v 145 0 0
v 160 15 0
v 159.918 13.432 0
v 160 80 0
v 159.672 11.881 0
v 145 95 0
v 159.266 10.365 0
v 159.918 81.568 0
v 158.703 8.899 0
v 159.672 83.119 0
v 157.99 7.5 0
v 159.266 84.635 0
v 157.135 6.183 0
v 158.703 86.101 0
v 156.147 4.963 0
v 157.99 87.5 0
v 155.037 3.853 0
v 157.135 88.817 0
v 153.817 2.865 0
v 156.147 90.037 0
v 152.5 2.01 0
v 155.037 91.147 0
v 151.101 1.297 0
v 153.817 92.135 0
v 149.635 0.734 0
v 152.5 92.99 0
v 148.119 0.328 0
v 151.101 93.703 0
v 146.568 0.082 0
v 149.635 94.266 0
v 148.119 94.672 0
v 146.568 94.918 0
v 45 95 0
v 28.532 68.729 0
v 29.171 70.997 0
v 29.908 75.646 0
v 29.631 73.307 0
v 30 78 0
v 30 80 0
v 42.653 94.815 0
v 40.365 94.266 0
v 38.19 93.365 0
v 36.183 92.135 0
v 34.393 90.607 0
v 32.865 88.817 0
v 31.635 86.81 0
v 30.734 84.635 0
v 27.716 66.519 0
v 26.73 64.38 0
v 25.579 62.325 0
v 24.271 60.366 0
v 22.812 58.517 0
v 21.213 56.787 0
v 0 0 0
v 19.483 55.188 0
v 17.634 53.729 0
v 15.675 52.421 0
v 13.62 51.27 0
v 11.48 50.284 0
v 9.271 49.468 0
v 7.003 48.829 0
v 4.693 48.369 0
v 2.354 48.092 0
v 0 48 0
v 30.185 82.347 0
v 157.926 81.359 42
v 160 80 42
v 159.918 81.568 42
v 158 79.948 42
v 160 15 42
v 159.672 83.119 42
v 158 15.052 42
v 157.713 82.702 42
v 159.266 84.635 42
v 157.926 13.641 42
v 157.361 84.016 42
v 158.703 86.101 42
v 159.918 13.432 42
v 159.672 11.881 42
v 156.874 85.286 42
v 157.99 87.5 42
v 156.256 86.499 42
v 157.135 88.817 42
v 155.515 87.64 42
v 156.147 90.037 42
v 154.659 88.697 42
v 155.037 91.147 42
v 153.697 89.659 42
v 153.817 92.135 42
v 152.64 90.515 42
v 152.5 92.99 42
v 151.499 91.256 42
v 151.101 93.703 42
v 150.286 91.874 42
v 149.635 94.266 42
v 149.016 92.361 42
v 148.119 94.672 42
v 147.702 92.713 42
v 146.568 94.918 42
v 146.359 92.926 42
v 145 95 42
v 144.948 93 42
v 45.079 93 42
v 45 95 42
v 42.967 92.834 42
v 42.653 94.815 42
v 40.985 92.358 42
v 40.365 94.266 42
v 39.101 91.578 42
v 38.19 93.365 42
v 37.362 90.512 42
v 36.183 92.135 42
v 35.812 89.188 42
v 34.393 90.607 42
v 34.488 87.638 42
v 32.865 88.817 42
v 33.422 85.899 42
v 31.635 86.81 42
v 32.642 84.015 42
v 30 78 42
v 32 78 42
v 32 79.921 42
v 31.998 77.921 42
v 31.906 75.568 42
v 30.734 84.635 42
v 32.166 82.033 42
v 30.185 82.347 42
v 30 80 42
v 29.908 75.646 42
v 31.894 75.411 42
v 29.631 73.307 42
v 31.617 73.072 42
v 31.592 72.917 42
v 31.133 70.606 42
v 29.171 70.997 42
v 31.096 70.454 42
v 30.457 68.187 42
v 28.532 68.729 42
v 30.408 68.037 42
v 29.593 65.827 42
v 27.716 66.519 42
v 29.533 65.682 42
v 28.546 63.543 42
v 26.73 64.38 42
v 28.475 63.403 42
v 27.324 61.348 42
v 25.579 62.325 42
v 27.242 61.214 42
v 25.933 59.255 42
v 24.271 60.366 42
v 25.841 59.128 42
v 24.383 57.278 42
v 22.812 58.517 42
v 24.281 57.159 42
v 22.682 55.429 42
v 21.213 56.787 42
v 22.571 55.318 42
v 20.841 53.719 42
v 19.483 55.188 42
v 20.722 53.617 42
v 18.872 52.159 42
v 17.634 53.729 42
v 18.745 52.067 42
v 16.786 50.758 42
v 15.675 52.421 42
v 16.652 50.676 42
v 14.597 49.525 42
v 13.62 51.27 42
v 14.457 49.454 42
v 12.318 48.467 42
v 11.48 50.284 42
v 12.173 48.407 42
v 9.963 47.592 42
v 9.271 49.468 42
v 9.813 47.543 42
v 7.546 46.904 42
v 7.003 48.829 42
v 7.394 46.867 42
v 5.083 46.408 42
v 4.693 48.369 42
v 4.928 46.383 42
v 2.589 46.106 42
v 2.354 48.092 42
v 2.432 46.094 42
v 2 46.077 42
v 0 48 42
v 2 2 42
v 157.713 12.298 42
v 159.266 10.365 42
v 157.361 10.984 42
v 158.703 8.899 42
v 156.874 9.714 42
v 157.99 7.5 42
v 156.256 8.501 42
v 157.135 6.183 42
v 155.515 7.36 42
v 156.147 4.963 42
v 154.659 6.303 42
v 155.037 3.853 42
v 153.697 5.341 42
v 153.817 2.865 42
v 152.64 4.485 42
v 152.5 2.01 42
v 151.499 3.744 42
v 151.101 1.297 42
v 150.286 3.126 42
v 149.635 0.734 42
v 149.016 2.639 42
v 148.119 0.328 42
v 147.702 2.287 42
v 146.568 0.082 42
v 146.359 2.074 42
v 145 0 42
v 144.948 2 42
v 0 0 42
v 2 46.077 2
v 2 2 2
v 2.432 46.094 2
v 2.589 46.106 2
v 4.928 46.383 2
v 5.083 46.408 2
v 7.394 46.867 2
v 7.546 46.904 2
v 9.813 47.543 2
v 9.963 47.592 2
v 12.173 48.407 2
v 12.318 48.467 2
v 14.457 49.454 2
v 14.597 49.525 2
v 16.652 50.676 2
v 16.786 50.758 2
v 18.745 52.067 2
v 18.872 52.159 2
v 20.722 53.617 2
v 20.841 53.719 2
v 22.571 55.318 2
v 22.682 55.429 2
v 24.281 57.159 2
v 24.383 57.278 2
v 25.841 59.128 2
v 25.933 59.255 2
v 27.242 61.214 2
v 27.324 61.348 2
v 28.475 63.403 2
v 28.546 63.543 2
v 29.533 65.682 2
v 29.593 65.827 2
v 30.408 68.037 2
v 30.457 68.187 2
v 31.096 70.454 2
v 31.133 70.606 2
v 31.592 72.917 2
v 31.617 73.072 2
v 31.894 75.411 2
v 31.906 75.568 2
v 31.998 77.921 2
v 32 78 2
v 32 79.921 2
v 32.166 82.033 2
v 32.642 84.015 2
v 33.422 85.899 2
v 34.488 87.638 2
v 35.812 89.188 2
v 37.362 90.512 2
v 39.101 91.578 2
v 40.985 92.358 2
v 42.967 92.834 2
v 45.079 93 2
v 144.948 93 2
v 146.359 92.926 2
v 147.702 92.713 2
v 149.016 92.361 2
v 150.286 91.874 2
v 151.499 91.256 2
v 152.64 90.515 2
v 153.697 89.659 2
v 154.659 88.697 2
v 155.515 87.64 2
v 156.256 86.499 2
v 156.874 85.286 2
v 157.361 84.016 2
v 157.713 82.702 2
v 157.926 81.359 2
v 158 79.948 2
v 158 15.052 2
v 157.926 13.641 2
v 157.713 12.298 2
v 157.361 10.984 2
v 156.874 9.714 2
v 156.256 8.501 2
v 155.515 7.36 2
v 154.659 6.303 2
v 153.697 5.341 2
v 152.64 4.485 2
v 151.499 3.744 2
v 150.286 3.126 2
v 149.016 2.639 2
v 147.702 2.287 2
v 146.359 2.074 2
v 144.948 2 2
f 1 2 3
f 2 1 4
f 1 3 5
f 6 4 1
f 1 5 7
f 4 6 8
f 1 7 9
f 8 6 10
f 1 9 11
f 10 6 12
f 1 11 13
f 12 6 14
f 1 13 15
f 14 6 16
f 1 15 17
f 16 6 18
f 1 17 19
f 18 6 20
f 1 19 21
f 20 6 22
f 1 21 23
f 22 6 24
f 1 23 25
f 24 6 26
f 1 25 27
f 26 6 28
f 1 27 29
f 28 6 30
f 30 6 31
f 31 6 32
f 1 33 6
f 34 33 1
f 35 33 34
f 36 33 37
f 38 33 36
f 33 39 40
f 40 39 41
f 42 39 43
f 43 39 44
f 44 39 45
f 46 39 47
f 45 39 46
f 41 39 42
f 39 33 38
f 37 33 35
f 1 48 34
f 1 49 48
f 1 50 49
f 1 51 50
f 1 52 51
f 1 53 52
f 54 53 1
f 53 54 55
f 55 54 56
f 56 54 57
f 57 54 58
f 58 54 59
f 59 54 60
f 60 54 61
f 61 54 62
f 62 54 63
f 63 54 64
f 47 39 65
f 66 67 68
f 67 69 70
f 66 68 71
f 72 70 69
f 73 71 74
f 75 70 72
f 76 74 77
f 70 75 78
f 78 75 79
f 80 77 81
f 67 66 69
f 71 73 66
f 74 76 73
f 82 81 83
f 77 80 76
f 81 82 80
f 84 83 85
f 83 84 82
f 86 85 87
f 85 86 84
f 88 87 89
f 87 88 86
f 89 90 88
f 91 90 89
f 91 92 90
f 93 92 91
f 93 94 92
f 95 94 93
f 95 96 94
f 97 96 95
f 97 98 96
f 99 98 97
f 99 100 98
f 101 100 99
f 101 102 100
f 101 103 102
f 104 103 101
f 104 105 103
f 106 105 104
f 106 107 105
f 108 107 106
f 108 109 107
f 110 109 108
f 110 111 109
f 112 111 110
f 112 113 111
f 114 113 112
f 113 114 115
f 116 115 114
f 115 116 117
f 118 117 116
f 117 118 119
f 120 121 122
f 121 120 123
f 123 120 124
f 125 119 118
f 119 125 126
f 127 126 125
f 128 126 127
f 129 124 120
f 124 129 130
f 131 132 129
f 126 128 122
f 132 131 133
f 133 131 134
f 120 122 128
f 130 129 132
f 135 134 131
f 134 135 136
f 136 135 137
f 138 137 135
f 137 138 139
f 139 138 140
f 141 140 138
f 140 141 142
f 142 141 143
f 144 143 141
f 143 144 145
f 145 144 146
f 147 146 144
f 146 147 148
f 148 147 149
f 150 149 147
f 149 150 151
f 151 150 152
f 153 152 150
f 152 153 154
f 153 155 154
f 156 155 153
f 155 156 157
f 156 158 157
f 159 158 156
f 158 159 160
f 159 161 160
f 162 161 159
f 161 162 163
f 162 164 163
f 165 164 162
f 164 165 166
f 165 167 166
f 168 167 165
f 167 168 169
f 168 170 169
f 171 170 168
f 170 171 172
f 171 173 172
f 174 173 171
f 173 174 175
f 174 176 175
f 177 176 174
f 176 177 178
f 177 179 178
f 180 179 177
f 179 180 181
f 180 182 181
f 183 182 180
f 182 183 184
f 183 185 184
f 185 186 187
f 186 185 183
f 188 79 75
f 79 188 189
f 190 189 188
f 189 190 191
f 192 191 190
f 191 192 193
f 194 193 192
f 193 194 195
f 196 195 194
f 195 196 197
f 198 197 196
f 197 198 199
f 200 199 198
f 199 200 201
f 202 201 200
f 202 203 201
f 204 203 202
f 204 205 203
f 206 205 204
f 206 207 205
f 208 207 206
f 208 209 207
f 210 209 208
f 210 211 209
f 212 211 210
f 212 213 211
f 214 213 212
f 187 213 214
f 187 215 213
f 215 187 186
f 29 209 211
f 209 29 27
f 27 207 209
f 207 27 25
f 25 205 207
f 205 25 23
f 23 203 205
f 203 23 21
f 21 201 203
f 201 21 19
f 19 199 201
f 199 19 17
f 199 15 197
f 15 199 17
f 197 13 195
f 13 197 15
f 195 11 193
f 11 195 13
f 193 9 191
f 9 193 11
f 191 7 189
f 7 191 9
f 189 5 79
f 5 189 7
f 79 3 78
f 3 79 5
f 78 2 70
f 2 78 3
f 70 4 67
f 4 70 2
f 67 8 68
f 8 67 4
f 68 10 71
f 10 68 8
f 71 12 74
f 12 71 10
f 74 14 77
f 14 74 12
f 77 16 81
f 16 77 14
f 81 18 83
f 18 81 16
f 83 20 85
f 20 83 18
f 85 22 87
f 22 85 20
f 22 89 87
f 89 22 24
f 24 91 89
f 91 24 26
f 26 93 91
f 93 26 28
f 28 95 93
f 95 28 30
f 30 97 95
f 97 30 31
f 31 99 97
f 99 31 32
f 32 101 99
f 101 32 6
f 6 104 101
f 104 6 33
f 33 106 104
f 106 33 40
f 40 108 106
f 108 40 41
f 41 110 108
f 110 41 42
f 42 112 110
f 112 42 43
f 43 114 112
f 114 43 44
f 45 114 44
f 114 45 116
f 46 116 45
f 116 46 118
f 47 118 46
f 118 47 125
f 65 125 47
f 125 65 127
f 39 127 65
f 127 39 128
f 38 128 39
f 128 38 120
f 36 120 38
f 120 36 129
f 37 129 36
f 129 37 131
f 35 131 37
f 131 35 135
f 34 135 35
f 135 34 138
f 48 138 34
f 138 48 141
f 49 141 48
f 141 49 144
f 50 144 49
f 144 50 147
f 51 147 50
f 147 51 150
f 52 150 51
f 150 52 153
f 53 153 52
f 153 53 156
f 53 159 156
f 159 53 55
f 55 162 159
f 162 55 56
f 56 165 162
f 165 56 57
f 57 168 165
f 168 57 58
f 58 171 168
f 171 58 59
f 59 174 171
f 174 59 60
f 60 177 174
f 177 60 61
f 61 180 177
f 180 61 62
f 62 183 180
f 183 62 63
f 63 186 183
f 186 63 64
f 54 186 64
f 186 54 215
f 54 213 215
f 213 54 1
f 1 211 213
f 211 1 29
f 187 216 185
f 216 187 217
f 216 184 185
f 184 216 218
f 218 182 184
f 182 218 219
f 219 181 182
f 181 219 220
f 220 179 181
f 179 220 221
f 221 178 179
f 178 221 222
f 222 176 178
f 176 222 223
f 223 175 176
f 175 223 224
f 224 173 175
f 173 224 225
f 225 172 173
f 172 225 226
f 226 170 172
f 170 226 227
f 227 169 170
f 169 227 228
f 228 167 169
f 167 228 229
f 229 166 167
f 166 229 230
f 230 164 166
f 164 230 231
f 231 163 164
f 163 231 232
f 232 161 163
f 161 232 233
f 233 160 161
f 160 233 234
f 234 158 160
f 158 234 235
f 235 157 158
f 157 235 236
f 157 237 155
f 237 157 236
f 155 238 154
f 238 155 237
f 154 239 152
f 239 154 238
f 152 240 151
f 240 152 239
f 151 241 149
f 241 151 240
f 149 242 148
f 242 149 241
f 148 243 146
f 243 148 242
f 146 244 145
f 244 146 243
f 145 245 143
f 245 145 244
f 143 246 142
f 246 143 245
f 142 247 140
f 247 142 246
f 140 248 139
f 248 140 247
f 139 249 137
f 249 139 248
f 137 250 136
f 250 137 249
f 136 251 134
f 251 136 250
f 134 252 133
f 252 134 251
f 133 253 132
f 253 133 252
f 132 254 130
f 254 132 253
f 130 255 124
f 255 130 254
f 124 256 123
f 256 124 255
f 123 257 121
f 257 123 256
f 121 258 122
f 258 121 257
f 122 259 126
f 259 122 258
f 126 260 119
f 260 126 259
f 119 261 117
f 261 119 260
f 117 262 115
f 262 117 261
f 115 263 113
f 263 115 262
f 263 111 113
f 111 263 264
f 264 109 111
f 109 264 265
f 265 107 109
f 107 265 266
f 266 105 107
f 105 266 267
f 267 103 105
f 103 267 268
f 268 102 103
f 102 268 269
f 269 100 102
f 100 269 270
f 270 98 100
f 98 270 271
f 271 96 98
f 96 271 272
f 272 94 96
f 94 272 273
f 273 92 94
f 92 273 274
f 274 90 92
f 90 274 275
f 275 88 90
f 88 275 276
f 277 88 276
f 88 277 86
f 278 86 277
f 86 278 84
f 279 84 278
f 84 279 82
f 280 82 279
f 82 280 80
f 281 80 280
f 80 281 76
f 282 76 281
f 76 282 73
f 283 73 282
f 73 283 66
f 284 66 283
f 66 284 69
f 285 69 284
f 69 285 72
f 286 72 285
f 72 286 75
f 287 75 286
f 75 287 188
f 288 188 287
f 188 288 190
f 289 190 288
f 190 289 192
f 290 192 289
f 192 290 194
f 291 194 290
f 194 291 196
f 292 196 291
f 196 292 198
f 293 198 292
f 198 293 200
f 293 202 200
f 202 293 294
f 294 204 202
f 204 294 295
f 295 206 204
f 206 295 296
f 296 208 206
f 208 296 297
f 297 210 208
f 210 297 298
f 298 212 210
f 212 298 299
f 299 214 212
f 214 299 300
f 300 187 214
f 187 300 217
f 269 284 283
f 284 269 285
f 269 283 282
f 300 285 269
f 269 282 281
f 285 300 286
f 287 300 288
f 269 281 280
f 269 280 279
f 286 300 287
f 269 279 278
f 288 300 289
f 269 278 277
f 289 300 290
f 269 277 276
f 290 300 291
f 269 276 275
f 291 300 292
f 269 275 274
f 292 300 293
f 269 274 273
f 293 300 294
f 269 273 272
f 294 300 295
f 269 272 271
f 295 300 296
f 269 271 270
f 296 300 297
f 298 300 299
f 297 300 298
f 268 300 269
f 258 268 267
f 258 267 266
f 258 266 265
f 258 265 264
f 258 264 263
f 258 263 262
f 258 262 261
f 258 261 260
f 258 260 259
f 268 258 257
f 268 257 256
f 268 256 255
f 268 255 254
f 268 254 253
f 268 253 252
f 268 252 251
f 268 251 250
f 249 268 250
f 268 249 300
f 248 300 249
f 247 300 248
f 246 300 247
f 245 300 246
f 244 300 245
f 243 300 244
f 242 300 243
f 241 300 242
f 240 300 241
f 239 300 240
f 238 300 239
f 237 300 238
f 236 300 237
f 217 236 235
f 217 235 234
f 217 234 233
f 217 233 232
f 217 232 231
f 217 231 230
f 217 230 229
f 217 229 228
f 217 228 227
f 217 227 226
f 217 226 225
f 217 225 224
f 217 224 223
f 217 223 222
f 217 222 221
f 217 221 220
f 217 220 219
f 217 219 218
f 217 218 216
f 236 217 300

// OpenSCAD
// 竹屎盒 v6 — R30 / 小矩形30×48 / 大矩形130×95 / 总宽160
$fn = 64; 
W = 2; // 墙厚
H = 42; // 高
B = 2; // 底厚
R15 = 15; // 盒子圆角
R30 = 30; // 拟合 X2D 圆角

function arc(cx, cy, r, a0, a1, n) = [for (i=[0:n]) 
    let(a = a0 + (a1-a0)*i/n) [cx + r*cos(a), cy + r*sin(a)]];

module outline_2d() {
    polygon(points = concat(
        // 前边: (0,0)→(30,0)→(145,0), 宽160
        [[0,0], [30,0], [145,0]],
        // R15右前(160,0) — 中心(145,15)
        arc(145, 15, R15, -90, 0, 15),
        // 右边: (160,15)→(160,80)
        [[160,80]],
        // R15右后(160,95) — 中心(145,80)
        arc(145, 80, R15, 0, 90, 15),
        // 后边: (145,95)→(45,95)
        [[45,95]],
        // R15左后(30,95) — 中心(45,80)
        arc(45, 80, R15, 90, 180, 10),
        // 大矩形左边下行: (30,80)→(30,78)
        [[30,78]],
        // R30外凸弧: (30,78)→(0,48), 中心(0,78), θ从0°→-90°CW
        arc(0, 78, R30, 0, -90, 20),
        // 小矩形左边闭合: (0,48)→(0,0)
        [[0,0]]
    ));
}

linear_extrude(H) difference() { outline_2d(); offset(r=-W) outline_2d(); }
linear_extrude(B) outline_2d();
